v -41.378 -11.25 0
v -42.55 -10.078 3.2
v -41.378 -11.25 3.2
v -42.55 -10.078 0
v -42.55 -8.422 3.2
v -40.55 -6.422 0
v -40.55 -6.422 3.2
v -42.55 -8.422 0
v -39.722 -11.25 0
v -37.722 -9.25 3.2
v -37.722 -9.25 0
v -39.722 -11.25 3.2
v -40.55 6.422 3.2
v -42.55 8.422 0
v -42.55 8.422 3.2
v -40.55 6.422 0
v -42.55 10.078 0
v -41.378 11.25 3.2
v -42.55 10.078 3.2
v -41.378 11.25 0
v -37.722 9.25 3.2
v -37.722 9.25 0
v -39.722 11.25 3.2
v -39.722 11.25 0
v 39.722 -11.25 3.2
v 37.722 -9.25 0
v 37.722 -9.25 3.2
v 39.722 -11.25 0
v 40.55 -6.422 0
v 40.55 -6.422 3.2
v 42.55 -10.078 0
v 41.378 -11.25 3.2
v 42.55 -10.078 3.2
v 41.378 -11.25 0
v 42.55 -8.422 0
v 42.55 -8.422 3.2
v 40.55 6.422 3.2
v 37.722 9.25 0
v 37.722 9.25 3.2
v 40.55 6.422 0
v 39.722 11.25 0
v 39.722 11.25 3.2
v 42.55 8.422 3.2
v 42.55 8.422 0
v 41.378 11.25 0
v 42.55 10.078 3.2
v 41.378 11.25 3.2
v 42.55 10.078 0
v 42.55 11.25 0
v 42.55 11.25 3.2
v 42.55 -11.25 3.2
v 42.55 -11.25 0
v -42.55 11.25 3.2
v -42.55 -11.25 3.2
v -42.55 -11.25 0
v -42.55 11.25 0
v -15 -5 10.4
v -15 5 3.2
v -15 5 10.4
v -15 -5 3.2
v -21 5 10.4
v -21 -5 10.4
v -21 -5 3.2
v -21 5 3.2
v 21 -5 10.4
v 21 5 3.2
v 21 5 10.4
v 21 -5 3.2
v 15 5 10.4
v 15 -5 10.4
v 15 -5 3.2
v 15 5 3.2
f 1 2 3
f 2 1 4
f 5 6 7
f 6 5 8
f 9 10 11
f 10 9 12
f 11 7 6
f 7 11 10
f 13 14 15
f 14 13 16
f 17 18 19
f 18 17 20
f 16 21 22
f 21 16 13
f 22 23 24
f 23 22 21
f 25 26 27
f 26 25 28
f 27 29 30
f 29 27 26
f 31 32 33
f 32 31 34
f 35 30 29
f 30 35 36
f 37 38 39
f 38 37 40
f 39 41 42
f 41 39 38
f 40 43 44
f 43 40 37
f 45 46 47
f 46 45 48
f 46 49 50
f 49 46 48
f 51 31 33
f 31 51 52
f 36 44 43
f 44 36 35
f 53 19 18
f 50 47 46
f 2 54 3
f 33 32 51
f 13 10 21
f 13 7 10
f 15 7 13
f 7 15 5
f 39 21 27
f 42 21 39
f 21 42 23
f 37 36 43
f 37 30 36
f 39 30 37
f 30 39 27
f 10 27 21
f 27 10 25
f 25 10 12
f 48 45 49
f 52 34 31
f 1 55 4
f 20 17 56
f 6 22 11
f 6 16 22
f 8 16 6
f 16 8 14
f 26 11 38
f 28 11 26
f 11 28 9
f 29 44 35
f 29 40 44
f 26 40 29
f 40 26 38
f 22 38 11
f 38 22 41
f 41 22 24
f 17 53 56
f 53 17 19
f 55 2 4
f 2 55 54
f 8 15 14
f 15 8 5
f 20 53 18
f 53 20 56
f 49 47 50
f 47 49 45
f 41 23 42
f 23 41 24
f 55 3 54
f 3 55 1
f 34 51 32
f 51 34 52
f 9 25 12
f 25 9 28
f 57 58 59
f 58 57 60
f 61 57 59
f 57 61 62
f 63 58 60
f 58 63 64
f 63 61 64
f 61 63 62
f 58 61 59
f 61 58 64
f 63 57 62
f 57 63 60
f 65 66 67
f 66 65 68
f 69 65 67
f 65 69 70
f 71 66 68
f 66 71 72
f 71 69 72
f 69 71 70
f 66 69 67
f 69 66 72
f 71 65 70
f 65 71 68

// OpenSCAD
$fn=64;

L = 85.1;
W = 22.5;
H = 3.2;

ch = 4.0;

pr_w = 10.0;
pr_t = 6.0;
pr_h = 7.2;

step_len = 2.2;
step_drop = 2.0;

pr1_x = -18.0;
pr2_x = 18.0;

module chamfered_bar(len, wid, ht, chamf){
    difference(){
        translate([0,0,ht/2]) cube([len,wid,ht], center=true);
        for (sx=[-1,1], sy=[-1,1]){
            translate([sx*(len/2 - chamf/2), sy*(wid/2 - chamf/2), ht/2])
                rotate([0,0,45]) cube([chamf, chamf, ht+0.4], center=true);
        }
    }
}

module prong(pr_len, pr_wid, pr_ht, stepL, stepDrop){
    union(){
        translate([0,0,pr_ht/2]) cube([pr_len, pr_wid, pr_ht], center=true);
        translate([pr_len/2 - stepL/2, 0, (pr_ht - stepDrop)/2])
            cube([stepL, pr_wid, pr_ht - stepDrop], center=true);
    }
}

module bracket(){
    union(){
        chamfered_bar(L,W,H,ch);
        translate([pr1_x, 0, H]) prong(pr_t, pr_w, pr_h, step_len, step_drop);
        translate([pr2_x, 0, H]) prong(pr_t, pr_w, pr_h, step_len, step_drop);
    }
}

bracket();
